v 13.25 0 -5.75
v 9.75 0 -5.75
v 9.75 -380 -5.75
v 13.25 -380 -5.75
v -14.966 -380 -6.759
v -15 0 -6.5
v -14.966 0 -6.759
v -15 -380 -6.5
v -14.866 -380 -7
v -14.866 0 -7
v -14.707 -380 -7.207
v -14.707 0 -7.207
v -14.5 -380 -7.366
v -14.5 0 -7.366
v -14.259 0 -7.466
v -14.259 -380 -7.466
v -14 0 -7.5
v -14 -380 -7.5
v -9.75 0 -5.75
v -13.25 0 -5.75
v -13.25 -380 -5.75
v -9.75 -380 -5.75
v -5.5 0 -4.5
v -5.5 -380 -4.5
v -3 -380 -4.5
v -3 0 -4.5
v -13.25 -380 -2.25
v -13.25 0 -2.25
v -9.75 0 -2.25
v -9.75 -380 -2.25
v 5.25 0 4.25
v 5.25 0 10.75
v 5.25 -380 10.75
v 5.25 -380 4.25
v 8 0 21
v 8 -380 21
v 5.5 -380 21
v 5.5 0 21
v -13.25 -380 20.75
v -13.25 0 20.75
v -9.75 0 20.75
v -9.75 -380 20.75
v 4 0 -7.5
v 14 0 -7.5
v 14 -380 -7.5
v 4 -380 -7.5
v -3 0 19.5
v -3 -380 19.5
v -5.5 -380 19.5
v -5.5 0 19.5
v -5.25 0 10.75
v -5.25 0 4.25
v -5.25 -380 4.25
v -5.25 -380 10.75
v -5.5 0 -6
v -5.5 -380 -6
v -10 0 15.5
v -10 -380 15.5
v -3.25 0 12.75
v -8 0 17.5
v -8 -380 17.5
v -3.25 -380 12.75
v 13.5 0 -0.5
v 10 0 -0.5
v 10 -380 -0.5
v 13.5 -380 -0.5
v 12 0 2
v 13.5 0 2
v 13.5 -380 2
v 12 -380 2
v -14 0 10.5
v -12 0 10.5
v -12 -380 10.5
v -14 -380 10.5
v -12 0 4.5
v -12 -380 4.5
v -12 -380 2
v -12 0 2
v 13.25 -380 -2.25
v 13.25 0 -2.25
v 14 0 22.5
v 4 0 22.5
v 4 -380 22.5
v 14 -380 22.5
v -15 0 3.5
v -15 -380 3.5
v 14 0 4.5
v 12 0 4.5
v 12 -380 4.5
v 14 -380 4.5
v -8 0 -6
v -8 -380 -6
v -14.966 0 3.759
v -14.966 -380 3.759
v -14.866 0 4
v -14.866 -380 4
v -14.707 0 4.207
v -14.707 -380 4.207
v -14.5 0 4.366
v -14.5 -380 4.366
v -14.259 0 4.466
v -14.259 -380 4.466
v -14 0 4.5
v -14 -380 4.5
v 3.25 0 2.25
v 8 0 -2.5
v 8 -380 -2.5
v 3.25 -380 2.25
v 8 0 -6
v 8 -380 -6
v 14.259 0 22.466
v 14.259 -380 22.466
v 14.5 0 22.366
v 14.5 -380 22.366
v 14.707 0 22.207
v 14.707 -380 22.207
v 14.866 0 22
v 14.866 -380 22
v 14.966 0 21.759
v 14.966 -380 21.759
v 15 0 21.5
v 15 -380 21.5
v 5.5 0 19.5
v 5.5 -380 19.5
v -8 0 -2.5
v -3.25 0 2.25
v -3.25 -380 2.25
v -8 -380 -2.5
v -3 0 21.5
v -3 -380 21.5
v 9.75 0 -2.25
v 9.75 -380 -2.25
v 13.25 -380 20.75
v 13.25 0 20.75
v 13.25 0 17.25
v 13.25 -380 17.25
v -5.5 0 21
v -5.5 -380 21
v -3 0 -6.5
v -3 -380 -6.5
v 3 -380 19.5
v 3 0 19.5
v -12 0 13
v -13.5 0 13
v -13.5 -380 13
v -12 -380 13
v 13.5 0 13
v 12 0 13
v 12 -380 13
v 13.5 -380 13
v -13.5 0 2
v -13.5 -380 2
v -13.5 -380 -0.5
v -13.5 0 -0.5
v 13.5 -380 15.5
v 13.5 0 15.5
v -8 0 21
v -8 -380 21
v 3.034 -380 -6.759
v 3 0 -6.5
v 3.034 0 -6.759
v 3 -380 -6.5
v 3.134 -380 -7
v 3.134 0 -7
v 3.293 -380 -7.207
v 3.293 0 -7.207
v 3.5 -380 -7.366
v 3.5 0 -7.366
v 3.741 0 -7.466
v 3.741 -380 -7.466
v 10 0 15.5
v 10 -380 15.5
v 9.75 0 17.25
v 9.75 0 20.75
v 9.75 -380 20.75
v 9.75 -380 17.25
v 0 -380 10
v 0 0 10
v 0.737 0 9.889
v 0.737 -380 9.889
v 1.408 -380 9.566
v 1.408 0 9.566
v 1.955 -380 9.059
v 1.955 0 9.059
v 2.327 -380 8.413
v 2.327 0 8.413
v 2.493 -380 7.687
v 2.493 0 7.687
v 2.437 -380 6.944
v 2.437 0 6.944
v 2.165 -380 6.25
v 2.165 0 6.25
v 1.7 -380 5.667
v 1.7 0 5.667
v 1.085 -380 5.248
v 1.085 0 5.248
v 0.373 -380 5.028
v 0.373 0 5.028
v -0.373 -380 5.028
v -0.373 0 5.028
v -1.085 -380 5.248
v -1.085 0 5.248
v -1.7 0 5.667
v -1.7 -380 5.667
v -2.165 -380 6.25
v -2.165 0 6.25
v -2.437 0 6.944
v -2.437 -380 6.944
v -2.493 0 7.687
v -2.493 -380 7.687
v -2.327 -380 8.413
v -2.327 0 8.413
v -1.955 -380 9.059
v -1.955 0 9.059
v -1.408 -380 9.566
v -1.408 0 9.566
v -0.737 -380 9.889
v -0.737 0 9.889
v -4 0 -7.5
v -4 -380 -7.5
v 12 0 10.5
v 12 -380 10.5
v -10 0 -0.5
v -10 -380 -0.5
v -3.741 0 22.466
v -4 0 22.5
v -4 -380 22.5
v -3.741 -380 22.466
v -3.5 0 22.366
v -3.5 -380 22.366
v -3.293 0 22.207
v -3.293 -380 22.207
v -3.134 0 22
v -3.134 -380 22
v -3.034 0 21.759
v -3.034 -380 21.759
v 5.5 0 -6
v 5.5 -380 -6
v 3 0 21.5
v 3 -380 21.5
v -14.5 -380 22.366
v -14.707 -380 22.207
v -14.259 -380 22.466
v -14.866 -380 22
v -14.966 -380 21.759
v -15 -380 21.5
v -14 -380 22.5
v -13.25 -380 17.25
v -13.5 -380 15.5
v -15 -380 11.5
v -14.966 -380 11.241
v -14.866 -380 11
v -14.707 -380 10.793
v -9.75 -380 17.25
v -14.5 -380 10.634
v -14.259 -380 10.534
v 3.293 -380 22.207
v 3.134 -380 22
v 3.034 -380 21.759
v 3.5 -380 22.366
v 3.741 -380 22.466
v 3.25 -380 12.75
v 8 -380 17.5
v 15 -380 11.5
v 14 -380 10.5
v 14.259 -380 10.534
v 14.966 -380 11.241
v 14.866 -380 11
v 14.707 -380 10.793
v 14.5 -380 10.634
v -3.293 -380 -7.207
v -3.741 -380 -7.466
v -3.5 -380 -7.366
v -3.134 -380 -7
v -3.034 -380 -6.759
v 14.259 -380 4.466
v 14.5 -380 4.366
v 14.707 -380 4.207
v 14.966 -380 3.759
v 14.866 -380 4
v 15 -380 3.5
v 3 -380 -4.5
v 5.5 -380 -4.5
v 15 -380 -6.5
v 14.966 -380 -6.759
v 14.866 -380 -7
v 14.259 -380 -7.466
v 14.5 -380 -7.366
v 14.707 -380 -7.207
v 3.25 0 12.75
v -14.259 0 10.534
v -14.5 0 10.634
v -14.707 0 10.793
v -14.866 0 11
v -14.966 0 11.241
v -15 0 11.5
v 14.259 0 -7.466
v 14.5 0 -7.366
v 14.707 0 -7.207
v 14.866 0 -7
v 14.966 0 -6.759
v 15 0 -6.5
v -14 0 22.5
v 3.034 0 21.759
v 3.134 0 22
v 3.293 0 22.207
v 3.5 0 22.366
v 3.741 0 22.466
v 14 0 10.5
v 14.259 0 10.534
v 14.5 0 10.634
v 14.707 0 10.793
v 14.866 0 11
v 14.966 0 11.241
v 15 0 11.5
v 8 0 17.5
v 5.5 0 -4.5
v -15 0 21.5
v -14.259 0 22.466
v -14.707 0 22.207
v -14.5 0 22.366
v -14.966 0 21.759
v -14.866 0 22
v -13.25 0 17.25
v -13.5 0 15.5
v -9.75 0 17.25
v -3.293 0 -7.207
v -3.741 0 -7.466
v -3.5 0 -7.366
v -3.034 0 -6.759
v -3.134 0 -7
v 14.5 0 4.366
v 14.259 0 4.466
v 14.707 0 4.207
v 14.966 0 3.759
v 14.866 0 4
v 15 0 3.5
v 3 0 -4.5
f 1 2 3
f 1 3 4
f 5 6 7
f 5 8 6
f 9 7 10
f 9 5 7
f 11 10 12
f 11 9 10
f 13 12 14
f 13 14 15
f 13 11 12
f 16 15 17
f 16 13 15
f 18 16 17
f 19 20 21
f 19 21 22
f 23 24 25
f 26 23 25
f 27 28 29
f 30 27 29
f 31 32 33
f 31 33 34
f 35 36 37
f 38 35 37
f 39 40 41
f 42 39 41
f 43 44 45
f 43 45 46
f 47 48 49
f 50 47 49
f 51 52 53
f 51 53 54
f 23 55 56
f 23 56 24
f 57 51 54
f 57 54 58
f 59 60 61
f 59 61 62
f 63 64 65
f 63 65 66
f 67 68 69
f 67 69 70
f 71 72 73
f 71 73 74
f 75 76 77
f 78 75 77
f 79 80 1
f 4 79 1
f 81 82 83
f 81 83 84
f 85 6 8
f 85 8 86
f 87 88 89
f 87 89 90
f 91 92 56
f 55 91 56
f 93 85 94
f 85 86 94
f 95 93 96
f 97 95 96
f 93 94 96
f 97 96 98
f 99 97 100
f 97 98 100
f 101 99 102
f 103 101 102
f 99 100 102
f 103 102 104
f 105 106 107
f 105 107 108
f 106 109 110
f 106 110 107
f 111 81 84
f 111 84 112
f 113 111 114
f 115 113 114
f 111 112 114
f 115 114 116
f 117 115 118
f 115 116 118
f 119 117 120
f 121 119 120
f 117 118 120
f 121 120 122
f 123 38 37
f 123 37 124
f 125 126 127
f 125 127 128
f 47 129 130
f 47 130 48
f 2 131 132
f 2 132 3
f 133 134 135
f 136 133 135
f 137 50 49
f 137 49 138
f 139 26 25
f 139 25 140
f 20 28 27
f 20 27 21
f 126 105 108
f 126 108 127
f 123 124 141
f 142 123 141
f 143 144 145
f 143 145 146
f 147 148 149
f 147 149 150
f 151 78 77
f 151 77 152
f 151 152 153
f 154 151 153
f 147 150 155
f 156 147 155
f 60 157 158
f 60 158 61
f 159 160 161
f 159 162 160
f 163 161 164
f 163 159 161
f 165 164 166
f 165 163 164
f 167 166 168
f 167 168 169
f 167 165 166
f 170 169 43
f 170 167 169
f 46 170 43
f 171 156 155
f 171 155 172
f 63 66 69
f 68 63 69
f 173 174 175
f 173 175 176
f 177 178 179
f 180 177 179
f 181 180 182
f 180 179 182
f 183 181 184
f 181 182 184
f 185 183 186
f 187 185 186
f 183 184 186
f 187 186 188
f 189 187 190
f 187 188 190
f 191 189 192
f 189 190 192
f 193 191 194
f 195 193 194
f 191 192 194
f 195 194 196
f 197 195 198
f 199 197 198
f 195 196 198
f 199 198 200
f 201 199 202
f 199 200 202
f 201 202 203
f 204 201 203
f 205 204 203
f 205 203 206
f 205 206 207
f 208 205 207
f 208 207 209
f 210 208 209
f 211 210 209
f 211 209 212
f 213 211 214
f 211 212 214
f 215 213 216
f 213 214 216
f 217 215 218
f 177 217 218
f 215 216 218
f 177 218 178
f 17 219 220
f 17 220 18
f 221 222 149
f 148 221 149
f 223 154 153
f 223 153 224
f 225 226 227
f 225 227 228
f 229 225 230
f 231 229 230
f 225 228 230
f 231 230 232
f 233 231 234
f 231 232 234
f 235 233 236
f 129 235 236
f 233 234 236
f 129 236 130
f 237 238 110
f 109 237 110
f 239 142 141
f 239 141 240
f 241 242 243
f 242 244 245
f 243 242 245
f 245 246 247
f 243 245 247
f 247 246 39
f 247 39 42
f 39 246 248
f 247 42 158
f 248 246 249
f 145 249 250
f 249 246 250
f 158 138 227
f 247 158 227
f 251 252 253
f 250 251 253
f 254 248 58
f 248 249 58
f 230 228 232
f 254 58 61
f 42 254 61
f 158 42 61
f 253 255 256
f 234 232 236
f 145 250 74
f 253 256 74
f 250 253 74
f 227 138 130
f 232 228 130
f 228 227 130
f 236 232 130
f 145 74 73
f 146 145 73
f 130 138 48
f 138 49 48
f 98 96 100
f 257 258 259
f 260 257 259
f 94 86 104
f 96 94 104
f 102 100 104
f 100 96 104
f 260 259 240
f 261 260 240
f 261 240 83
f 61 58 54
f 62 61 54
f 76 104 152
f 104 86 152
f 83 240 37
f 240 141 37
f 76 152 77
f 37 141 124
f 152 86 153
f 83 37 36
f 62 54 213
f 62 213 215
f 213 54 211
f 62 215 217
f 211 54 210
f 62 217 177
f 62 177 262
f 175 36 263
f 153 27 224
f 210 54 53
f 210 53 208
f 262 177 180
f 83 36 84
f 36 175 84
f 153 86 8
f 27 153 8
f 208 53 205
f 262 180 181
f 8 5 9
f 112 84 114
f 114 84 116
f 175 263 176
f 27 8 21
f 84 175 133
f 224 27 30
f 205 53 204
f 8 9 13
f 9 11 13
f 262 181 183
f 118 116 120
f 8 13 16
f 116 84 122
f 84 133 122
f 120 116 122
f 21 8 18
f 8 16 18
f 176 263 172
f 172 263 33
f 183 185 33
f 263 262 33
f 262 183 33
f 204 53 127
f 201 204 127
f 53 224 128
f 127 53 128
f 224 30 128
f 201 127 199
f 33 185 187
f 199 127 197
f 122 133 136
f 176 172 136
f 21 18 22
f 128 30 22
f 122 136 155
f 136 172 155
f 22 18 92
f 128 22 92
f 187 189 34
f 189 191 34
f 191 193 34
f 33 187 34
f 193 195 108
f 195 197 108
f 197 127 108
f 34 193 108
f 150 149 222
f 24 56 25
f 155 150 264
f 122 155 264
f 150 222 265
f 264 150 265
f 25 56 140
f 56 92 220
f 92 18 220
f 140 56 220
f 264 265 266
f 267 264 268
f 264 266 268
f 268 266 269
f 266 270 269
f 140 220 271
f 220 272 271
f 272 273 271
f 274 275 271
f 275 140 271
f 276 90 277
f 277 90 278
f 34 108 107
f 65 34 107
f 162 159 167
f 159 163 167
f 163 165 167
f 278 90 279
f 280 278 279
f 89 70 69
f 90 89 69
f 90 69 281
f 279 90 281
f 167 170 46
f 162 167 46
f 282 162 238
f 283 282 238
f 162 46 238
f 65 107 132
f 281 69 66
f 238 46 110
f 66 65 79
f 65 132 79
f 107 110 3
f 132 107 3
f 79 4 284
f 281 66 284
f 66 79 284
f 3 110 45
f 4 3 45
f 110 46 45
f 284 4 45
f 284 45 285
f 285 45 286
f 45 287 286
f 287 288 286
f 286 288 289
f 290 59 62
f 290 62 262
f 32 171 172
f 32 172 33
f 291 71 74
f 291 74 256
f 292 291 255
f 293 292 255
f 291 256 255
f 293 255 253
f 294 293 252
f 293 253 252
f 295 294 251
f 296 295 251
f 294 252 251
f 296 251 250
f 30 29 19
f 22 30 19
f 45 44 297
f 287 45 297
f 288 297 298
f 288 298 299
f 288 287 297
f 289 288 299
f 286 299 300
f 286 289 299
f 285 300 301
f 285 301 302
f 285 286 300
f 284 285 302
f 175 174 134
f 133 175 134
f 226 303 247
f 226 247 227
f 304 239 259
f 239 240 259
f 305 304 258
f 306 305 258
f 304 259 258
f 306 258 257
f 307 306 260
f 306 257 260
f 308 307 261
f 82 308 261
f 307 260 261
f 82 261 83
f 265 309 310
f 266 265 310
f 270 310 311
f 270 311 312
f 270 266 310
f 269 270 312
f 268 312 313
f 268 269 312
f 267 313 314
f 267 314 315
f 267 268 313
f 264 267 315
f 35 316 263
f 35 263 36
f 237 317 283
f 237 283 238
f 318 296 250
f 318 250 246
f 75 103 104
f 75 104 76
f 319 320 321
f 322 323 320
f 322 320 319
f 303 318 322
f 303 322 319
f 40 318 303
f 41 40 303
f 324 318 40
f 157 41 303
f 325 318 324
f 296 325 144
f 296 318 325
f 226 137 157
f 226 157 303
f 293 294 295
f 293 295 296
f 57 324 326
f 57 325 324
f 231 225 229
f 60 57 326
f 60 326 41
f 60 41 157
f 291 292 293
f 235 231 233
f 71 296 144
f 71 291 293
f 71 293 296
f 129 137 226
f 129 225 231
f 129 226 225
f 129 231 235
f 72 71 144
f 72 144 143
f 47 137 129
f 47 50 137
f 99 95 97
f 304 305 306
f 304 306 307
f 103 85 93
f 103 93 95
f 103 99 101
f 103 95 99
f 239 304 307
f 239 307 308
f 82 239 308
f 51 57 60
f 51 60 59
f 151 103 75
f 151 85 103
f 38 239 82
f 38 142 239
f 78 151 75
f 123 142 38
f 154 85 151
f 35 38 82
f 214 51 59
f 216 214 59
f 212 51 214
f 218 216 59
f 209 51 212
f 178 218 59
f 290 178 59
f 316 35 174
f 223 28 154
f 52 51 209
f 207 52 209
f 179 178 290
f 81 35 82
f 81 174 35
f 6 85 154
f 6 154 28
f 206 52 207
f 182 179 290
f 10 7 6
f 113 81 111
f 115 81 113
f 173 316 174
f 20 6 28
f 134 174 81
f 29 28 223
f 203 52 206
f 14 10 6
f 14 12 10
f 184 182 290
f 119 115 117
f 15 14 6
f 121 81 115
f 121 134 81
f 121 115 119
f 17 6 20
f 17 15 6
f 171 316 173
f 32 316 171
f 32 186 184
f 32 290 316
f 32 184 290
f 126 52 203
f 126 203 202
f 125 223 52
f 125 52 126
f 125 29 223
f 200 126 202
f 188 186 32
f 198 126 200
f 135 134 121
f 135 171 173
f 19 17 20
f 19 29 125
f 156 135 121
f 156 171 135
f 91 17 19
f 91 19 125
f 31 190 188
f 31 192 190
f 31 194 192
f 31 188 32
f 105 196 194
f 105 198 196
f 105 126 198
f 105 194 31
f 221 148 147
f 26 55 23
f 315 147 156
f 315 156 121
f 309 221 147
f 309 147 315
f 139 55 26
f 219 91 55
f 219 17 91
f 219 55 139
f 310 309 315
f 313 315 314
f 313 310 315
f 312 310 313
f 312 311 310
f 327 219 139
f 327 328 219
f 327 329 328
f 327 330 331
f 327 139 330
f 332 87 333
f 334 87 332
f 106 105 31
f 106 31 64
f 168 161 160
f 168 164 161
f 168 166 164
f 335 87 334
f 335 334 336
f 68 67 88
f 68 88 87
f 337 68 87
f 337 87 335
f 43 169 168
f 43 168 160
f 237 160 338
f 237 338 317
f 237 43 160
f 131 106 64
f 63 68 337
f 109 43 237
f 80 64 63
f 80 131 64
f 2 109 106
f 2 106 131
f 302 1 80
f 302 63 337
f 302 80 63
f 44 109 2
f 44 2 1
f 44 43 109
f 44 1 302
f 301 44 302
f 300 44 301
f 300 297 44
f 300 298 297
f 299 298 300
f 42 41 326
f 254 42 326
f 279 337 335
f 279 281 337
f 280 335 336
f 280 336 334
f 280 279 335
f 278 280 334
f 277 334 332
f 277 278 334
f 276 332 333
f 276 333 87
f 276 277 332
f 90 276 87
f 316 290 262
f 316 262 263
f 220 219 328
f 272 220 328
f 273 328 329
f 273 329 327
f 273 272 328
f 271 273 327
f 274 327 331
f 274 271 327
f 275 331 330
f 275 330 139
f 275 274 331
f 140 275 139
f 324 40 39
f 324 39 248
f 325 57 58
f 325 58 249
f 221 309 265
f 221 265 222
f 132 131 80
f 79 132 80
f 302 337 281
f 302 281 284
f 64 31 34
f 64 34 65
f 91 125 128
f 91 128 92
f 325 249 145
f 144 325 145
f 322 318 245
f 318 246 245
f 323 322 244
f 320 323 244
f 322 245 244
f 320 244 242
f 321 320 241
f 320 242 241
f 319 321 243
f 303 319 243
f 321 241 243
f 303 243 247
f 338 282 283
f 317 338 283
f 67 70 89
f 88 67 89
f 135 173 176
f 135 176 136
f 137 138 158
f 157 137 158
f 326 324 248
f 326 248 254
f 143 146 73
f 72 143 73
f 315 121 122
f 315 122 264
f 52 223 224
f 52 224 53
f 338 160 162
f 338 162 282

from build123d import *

# Parameters (mm, degrees)
SKETCH1_R           = 2.5
SKETCH1_W           = 3.5
SKETCH1_H           = 3.5
BOSS_EXTRUDE1_DEPTH = 380
FILLET1_R           = 1


with BuildPart() as part:
    # Sketch1 → Boss-Extrude1 (new body)
    with BuildSketch(Plane(origin=(0, 0, 0), x_dir=(1, 0, 0), z_dir=(0, 1, 0))):
        Polygon((-15, 7.5), (-15, -4.5), (-12, -4.5), (-12, -2), (-13.5, -2), (-13.5, 0.5), (-10, 0.5), (-5.25, -4.25), (-5.25, -10.75), (-10, -15.5), (-13.5, -15.5), (-13.5, -13), (-12, -13), (-12, -10.5), (-15, -10.5), (-15, -22.5), (-3, -22.5), (-3, -19.5), (-5.5, -19.5), (-5.5, -21), (-8, -21), (-8, -17.5), (-3.25, -12.75), (3.25, -12.75), (8, -17.5), (8, -21), (5.5, -21), (5.5, -19.5), (3, -19.5), (3, -22.5), (15, -22.5), (15, -10.5), (12, -10.5), (12, -13), (13.5, -13), (13.5, -15.5), (10, -15.5), (5.25, -10.75), (5.25, -4.25), (10, 0.5), (13.5, 0.5), (13.5, -2), (12, -2), (12, -4.5), (15, -4.5), (15, 7.5), (3, 7.5), (3, 4.5), (5.5, 4.5), (5.5, 6), (8, 6), (8, 2.5), (3.25, -2.25), (-3.25, -2.25), (-8, 2.5), (-8, 6), (-5.5, 6), (-5.5, 4.5), (-3, 4.5), (-3, 7.5), align=None)
        with Locations(Location((0, -7.5, 0), (0, 0, 270))):
            Circle(SKETCH1_R, mode=Mode.SUBTRACT)
        with Locations((-11.5, 4)):
            Rectangle(SKETCH1_W, SKETCH1_H, mode=Mode.SUBTRACT)
        with Locations((11.5, 4)):
            Rectangle(SKETCH1_W, SKETCH1_H, mode=Mode.SUBTRACT)
        with Locations((11.5, -19)):
            Rectangle(SKETCH1_W, SKETCH1_H, mode=Mode.SUBTRACT)
        with Locations((-11.5, -19)):
            Rectangle(SKETCH1_W, SKETCH1_H, mode=Mode.SUBTRACT)
    extrude(amount=-BOSS_EXTRUDE1_DEPTH)

    # Fillet1
    fillet1_edges = [part.edges().sort_by_distance(p)[0] for p in [
        (15, -190, 10.5),
        (15, -190, 22.5),
        (3, -190, 22.5),
        (-3, -190, 22.5),
        (-15, -190, 22.5),
        (-15, -190, 10.5),
        (-15, -190, 4.5),
        (-15, -190, -7.5),
        (-3, -190, -7.5),
        (3, -190, -7.5),
        (15, -190, -7.5),
        (15, -190, 4.5),
    ]]
    fillet(fillet1_edges, radius=FILLET1_R)


solid = part.part
